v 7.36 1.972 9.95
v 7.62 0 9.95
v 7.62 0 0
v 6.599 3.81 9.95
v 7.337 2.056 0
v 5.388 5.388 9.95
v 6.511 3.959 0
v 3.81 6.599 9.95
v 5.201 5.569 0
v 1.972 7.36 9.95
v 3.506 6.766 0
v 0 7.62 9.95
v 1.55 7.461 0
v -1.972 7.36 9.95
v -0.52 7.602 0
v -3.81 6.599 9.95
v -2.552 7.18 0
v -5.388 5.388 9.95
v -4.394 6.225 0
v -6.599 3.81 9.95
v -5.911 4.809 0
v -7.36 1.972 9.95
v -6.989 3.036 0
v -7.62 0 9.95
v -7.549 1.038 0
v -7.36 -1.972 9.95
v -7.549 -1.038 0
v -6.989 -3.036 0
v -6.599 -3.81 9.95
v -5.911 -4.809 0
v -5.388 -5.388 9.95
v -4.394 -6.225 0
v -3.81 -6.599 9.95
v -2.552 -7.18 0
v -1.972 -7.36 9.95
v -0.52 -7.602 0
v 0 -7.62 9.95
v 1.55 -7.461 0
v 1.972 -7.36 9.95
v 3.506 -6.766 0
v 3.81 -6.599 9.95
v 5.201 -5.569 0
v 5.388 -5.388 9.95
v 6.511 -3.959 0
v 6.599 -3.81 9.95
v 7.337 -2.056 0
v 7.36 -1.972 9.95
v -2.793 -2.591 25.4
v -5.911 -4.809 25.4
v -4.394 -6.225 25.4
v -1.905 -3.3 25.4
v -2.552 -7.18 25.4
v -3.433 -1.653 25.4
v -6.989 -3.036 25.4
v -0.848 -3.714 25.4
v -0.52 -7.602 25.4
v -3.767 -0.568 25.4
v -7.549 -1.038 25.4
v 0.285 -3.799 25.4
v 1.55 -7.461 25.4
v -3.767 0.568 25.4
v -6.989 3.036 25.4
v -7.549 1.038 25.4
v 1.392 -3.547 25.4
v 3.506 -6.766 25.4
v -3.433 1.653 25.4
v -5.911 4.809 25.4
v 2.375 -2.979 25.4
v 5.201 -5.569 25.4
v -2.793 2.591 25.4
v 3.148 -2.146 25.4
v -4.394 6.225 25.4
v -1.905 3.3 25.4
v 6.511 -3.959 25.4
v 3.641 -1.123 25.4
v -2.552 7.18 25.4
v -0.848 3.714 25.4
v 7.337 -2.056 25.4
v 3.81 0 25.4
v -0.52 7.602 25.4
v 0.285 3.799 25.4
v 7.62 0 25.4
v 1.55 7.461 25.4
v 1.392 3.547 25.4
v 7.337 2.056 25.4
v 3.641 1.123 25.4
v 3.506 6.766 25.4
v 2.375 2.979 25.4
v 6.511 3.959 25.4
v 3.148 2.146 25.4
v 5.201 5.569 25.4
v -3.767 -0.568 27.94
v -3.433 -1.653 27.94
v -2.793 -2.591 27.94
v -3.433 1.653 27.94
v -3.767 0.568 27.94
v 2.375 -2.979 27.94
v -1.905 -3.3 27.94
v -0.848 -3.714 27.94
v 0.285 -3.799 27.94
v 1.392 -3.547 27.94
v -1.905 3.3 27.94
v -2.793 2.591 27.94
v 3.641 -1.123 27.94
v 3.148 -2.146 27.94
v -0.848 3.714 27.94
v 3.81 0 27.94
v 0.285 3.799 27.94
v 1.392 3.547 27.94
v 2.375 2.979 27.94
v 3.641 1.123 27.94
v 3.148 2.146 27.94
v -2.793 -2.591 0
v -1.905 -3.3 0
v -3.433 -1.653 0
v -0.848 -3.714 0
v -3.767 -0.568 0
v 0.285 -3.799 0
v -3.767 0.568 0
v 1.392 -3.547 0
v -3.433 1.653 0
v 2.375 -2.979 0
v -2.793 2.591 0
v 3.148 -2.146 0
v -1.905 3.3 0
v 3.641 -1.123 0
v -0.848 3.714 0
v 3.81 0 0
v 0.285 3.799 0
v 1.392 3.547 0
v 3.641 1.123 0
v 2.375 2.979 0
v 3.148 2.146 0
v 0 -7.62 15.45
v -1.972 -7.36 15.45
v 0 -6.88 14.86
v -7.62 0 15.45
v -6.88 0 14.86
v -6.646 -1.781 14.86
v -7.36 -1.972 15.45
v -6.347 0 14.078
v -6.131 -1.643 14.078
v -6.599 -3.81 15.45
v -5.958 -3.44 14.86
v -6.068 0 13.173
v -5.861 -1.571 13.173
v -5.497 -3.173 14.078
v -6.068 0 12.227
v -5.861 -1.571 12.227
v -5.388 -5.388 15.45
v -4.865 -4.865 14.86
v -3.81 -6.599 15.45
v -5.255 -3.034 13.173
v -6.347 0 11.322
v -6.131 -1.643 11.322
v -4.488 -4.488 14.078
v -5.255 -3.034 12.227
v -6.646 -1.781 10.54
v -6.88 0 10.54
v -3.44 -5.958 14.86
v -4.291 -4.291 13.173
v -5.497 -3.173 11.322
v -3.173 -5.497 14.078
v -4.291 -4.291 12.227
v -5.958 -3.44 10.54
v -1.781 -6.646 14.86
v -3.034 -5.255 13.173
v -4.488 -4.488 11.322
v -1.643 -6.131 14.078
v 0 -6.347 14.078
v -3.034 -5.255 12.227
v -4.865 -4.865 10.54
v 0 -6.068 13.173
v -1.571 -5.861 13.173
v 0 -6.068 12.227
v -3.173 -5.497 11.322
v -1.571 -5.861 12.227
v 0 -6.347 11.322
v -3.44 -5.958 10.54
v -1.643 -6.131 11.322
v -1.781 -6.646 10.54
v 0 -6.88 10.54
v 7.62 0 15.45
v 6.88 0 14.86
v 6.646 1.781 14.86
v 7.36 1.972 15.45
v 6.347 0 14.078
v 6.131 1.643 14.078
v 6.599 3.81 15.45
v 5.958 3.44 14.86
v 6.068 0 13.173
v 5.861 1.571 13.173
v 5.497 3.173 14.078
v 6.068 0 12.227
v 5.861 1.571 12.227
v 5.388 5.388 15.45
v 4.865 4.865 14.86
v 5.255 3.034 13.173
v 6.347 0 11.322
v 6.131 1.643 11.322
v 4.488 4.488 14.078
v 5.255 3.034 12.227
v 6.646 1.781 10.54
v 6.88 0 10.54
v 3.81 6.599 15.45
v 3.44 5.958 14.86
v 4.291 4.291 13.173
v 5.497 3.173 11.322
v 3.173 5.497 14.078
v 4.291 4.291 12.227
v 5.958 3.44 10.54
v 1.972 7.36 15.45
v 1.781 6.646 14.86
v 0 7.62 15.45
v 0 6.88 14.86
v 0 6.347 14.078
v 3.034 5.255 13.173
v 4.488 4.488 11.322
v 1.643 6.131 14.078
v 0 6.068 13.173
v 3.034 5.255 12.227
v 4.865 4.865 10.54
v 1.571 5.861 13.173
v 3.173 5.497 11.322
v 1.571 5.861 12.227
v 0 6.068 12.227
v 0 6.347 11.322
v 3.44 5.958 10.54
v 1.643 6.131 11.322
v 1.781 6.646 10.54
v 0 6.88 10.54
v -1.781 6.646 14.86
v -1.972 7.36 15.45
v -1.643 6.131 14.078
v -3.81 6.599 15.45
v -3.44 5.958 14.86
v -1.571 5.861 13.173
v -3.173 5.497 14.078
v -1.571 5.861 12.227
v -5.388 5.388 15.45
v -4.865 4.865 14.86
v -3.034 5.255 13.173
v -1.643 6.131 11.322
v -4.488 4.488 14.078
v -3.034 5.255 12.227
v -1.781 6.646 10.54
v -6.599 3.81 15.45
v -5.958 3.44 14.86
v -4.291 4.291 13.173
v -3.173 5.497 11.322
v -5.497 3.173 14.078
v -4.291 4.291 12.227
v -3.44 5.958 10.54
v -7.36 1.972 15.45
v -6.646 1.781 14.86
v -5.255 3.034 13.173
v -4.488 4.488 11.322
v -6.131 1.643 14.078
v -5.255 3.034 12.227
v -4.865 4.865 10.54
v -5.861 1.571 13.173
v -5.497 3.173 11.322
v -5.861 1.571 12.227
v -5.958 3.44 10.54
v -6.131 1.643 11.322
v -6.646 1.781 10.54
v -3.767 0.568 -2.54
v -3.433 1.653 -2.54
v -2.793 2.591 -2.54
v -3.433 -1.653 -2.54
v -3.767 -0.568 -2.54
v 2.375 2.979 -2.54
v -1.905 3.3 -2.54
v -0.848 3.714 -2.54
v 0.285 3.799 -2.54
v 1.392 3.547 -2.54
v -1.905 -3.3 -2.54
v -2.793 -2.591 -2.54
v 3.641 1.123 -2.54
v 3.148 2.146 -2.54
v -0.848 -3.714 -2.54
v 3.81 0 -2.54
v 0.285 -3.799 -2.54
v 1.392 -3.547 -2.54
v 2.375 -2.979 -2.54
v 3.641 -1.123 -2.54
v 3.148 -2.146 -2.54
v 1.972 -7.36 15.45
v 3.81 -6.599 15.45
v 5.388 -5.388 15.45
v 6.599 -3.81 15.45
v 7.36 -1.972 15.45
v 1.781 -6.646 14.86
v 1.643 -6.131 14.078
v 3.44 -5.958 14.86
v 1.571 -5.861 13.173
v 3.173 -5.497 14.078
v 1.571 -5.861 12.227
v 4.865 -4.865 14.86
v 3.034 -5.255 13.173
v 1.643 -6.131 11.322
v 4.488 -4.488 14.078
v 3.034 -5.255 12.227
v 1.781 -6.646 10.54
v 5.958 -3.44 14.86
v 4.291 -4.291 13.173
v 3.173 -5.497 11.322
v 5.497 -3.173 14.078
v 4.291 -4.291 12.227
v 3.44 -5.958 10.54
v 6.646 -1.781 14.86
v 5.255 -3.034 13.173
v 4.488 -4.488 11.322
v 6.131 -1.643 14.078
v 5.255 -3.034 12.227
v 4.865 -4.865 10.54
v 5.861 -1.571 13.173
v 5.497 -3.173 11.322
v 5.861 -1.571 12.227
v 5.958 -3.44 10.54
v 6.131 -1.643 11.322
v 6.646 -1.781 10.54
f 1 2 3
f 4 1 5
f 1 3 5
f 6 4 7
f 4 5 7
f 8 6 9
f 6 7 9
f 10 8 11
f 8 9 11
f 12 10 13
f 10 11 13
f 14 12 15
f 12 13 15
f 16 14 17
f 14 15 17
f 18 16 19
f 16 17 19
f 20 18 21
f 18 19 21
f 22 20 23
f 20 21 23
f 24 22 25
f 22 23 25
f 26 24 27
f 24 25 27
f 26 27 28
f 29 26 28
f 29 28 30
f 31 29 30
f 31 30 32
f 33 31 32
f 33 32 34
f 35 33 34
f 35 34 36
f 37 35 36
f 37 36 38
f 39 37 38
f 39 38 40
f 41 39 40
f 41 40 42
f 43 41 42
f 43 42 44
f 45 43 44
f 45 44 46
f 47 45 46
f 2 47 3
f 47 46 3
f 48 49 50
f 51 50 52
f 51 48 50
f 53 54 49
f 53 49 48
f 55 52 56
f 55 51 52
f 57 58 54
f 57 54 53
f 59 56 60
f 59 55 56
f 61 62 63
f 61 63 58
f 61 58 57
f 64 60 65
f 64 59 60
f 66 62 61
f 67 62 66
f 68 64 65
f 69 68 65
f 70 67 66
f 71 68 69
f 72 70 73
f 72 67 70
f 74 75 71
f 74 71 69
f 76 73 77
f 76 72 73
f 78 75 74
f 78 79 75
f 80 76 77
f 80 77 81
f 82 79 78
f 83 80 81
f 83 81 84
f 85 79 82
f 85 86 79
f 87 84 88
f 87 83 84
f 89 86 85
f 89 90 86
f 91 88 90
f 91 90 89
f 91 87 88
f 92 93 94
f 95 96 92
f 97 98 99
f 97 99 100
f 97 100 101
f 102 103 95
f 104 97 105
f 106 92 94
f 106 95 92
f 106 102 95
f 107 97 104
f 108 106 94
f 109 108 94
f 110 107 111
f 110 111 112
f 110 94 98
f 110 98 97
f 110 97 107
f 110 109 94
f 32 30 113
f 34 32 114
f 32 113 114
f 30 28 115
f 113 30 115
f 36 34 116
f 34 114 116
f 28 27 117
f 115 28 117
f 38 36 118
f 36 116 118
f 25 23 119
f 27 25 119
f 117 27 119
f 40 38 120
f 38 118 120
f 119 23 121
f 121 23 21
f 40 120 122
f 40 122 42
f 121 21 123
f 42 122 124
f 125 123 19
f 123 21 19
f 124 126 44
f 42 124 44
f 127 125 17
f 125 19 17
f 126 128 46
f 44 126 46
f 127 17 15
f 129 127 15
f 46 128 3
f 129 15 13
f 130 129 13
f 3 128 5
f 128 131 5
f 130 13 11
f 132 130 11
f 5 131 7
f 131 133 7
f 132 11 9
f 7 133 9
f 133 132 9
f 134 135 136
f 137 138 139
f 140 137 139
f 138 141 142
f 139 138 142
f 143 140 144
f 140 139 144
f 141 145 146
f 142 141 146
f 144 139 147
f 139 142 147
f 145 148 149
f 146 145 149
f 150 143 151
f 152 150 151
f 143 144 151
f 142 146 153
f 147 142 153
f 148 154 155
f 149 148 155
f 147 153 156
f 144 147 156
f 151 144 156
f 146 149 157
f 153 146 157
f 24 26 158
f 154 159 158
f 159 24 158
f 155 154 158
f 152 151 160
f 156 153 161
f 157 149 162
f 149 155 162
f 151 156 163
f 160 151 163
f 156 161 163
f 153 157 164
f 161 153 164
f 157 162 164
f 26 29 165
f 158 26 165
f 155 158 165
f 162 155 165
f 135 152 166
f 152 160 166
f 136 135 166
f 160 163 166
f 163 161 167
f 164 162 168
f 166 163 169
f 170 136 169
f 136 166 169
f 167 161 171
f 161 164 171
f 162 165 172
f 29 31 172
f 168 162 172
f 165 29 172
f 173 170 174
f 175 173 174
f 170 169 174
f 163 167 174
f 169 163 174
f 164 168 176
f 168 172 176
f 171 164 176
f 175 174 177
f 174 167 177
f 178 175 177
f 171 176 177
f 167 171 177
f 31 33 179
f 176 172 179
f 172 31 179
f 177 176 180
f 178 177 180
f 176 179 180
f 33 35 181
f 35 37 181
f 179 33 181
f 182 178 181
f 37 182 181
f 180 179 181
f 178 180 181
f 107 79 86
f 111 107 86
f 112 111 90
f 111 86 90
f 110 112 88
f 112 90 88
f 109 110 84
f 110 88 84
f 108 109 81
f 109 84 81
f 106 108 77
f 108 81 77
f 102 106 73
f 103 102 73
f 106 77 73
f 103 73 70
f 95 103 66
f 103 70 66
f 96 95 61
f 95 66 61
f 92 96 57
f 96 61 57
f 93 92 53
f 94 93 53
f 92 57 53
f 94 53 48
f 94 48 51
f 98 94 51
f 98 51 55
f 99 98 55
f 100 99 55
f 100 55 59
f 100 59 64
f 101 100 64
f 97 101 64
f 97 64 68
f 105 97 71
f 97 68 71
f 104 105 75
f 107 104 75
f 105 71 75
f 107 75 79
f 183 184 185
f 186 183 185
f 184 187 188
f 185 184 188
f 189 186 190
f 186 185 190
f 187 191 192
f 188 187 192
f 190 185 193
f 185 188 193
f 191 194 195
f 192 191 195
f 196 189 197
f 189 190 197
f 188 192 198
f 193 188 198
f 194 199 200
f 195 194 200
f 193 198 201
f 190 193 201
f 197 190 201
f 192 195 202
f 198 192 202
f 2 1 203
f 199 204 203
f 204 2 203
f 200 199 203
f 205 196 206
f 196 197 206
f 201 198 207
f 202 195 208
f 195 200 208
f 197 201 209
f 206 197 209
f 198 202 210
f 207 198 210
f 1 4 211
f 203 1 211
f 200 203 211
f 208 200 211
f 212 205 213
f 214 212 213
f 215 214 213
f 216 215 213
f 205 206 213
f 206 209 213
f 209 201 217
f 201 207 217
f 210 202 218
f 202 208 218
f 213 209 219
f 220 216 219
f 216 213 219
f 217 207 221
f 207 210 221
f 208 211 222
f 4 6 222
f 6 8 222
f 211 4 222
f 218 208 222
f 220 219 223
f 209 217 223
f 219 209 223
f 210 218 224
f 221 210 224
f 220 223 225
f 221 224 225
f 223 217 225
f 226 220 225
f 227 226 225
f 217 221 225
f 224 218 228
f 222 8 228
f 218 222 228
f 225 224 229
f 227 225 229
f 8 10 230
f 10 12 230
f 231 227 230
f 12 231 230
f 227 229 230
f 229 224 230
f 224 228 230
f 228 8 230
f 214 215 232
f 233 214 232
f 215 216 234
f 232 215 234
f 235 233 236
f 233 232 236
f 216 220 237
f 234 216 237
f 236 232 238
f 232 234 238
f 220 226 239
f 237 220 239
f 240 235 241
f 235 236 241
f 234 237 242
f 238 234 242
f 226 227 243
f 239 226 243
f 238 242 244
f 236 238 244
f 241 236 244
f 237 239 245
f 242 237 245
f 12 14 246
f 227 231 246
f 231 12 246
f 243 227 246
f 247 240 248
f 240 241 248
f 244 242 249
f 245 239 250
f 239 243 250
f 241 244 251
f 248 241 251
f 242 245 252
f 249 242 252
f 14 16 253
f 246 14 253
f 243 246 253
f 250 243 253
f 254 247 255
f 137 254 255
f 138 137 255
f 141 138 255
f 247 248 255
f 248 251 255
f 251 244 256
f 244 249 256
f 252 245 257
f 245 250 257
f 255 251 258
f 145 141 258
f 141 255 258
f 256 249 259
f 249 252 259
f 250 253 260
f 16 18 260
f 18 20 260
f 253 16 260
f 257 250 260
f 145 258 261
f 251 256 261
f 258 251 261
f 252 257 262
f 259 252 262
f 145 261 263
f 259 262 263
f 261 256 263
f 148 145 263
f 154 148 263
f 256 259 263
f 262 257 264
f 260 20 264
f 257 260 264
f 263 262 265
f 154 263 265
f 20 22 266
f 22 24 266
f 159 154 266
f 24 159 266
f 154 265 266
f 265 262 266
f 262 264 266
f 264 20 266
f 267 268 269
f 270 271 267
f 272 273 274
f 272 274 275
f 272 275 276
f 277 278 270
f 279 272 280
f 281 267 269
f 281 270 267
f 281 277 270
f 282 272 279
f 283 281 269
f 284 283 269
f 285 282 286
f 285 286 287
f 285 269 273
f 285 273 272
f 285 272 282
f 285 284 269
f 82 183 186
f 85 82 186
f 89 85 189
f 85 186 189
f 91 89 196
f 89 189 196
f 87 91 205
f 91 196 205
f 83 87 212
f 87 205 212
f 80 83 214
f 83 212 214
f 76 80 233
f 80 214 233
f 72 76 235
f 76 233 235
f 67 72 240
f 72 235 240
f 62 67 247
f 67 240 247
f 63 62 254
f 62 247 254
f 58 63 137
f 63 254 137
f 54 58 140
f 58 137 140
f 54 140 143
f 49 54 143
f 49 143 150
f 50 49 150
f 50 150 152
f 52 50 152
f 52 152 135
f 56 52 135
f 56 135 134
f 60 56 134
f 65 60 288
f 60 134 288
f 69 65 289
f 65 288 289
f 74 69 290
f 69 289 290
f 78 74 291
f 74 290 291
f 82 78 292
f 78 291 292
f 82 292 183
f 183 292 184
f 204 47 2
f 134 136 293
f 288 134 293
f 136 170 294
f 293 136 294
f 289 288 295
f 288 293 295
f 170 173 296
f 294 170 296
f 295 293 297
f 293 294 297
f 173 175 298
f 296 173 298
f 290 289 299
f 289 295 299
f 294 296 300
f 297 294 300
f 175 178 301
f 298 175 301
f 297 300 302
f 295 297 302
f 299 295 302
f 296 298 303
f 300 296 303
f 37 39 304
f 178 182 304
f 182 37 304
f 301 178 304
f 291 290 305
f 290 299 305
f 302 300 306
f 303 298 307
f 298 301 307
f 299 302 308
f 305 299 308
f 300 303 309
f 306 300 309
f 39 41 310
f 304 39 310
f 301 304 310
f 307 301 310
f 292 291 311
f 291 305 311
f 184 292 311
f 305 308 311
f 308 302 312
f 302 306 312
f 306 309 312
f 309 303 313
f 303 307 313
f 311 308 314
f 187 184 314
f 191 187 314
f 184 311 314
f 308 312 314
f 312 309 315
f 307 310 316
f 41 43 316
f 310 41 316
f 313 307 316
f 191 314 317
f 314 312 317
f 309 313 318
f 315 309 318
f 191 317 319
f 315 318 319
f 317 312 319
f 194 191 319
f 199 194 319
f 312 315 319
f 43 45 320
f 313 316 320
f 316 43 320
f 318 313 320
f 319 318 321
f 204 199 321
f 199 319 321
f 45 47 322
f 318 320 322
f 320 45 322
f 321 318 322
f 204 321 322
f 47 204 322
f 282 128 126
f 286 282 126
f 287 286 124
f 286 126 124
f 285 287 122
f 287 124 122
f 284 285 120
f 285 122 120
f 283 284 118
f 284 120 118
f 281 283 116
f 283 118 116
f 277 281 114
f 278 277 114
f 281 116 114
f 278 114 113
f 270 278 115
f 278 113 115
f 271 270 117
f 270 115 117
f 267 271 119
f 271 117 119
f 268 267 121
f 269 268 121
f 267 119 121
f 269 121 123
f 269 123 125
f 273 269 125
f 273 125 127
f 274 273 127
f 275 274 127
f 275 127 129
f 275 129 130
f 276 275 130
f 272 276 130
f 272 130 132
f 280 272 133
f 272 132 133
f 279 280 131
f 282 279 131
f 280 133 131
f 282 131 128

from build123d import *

# Parameters (mm, degrees)
SKETCH1_R           = 7.62
BOSS_EXTRUDE1_DEPTH = 25.4
SKETCH3_R           = 3.81
BOSS_EXTRUDE2_DEPTH = 2.54
SKETCH4_R           = 3.81
BOSS_EXTRUDE3_DEPTH = 2.54


with BuildPart() as part:
    # Sketch1 → Boss-Extrude1 (new body)
    with BuildSketch(Plane.XY):
        Circle(SKETCH1_R)
    extrude(amount=BOSS_EXTRUDE1_DEPTH)

    # Cut-Sweep1: sweep along a curve in space
    with BuildLine() as cut_sweep1_path:
        ThreePointArc((7.62, 0, 0), (5.388153673, 5.388153673, 0), (0, 7.62, 0))
        ThreePointArc((0, 7.62, 0), (-5.388153673, 5.388153673, 0), (-7.62, 0, 0))
        ThreePointArc((-7.62, 0, 0), (-5.388153673, -5.388153673, 0), (0, -7.62, 0))
        ThreePointArc((0, -7.62, 0), (5.388153673, -5.388153673, 0), (7.62, 0, 0))
    # Sketch2 → Cut-Sweep1 (sweep, cut)
    with BuildSketch(Plane(origin=(0, 0, 0), x_dir=(1, 0, 0), z_dir=(0, 1, 0))):
        with BuildLine():
            Line((7.62, -9.950369343), (7.62, -15.449630657))
            ThreePointArc((7.62, -15.449630657), (6.0325, -12.7), (7.62, -9.950369343))
        make_face()
    sweep(path=cut_sweep1_path.line, mode=Mode.SUBTRACT)

    # Sketch3 → Boss-Extrude2 (add)
    with BuildSketch(Plane.XY.offset(25.4)):
        Circle(SKETCH3_R)
    extrude(amount=BOSS_EXTRUDE2_DEPTH)

    # Sketch4 → Boss-Extrude3 (add)
    with BuildSketch(Plane(origin=(0, 0, 0), x_dir=(-1, 0, 0), z_dir=(0, 0, -1))):
        with Locations(Location((0, 0, 0), (0, 0, 180))):
            Circle(SKETCH4_R)
    extrude(amount=BOSS_EXTRUDE3_DEPTH)


solid = part.part
